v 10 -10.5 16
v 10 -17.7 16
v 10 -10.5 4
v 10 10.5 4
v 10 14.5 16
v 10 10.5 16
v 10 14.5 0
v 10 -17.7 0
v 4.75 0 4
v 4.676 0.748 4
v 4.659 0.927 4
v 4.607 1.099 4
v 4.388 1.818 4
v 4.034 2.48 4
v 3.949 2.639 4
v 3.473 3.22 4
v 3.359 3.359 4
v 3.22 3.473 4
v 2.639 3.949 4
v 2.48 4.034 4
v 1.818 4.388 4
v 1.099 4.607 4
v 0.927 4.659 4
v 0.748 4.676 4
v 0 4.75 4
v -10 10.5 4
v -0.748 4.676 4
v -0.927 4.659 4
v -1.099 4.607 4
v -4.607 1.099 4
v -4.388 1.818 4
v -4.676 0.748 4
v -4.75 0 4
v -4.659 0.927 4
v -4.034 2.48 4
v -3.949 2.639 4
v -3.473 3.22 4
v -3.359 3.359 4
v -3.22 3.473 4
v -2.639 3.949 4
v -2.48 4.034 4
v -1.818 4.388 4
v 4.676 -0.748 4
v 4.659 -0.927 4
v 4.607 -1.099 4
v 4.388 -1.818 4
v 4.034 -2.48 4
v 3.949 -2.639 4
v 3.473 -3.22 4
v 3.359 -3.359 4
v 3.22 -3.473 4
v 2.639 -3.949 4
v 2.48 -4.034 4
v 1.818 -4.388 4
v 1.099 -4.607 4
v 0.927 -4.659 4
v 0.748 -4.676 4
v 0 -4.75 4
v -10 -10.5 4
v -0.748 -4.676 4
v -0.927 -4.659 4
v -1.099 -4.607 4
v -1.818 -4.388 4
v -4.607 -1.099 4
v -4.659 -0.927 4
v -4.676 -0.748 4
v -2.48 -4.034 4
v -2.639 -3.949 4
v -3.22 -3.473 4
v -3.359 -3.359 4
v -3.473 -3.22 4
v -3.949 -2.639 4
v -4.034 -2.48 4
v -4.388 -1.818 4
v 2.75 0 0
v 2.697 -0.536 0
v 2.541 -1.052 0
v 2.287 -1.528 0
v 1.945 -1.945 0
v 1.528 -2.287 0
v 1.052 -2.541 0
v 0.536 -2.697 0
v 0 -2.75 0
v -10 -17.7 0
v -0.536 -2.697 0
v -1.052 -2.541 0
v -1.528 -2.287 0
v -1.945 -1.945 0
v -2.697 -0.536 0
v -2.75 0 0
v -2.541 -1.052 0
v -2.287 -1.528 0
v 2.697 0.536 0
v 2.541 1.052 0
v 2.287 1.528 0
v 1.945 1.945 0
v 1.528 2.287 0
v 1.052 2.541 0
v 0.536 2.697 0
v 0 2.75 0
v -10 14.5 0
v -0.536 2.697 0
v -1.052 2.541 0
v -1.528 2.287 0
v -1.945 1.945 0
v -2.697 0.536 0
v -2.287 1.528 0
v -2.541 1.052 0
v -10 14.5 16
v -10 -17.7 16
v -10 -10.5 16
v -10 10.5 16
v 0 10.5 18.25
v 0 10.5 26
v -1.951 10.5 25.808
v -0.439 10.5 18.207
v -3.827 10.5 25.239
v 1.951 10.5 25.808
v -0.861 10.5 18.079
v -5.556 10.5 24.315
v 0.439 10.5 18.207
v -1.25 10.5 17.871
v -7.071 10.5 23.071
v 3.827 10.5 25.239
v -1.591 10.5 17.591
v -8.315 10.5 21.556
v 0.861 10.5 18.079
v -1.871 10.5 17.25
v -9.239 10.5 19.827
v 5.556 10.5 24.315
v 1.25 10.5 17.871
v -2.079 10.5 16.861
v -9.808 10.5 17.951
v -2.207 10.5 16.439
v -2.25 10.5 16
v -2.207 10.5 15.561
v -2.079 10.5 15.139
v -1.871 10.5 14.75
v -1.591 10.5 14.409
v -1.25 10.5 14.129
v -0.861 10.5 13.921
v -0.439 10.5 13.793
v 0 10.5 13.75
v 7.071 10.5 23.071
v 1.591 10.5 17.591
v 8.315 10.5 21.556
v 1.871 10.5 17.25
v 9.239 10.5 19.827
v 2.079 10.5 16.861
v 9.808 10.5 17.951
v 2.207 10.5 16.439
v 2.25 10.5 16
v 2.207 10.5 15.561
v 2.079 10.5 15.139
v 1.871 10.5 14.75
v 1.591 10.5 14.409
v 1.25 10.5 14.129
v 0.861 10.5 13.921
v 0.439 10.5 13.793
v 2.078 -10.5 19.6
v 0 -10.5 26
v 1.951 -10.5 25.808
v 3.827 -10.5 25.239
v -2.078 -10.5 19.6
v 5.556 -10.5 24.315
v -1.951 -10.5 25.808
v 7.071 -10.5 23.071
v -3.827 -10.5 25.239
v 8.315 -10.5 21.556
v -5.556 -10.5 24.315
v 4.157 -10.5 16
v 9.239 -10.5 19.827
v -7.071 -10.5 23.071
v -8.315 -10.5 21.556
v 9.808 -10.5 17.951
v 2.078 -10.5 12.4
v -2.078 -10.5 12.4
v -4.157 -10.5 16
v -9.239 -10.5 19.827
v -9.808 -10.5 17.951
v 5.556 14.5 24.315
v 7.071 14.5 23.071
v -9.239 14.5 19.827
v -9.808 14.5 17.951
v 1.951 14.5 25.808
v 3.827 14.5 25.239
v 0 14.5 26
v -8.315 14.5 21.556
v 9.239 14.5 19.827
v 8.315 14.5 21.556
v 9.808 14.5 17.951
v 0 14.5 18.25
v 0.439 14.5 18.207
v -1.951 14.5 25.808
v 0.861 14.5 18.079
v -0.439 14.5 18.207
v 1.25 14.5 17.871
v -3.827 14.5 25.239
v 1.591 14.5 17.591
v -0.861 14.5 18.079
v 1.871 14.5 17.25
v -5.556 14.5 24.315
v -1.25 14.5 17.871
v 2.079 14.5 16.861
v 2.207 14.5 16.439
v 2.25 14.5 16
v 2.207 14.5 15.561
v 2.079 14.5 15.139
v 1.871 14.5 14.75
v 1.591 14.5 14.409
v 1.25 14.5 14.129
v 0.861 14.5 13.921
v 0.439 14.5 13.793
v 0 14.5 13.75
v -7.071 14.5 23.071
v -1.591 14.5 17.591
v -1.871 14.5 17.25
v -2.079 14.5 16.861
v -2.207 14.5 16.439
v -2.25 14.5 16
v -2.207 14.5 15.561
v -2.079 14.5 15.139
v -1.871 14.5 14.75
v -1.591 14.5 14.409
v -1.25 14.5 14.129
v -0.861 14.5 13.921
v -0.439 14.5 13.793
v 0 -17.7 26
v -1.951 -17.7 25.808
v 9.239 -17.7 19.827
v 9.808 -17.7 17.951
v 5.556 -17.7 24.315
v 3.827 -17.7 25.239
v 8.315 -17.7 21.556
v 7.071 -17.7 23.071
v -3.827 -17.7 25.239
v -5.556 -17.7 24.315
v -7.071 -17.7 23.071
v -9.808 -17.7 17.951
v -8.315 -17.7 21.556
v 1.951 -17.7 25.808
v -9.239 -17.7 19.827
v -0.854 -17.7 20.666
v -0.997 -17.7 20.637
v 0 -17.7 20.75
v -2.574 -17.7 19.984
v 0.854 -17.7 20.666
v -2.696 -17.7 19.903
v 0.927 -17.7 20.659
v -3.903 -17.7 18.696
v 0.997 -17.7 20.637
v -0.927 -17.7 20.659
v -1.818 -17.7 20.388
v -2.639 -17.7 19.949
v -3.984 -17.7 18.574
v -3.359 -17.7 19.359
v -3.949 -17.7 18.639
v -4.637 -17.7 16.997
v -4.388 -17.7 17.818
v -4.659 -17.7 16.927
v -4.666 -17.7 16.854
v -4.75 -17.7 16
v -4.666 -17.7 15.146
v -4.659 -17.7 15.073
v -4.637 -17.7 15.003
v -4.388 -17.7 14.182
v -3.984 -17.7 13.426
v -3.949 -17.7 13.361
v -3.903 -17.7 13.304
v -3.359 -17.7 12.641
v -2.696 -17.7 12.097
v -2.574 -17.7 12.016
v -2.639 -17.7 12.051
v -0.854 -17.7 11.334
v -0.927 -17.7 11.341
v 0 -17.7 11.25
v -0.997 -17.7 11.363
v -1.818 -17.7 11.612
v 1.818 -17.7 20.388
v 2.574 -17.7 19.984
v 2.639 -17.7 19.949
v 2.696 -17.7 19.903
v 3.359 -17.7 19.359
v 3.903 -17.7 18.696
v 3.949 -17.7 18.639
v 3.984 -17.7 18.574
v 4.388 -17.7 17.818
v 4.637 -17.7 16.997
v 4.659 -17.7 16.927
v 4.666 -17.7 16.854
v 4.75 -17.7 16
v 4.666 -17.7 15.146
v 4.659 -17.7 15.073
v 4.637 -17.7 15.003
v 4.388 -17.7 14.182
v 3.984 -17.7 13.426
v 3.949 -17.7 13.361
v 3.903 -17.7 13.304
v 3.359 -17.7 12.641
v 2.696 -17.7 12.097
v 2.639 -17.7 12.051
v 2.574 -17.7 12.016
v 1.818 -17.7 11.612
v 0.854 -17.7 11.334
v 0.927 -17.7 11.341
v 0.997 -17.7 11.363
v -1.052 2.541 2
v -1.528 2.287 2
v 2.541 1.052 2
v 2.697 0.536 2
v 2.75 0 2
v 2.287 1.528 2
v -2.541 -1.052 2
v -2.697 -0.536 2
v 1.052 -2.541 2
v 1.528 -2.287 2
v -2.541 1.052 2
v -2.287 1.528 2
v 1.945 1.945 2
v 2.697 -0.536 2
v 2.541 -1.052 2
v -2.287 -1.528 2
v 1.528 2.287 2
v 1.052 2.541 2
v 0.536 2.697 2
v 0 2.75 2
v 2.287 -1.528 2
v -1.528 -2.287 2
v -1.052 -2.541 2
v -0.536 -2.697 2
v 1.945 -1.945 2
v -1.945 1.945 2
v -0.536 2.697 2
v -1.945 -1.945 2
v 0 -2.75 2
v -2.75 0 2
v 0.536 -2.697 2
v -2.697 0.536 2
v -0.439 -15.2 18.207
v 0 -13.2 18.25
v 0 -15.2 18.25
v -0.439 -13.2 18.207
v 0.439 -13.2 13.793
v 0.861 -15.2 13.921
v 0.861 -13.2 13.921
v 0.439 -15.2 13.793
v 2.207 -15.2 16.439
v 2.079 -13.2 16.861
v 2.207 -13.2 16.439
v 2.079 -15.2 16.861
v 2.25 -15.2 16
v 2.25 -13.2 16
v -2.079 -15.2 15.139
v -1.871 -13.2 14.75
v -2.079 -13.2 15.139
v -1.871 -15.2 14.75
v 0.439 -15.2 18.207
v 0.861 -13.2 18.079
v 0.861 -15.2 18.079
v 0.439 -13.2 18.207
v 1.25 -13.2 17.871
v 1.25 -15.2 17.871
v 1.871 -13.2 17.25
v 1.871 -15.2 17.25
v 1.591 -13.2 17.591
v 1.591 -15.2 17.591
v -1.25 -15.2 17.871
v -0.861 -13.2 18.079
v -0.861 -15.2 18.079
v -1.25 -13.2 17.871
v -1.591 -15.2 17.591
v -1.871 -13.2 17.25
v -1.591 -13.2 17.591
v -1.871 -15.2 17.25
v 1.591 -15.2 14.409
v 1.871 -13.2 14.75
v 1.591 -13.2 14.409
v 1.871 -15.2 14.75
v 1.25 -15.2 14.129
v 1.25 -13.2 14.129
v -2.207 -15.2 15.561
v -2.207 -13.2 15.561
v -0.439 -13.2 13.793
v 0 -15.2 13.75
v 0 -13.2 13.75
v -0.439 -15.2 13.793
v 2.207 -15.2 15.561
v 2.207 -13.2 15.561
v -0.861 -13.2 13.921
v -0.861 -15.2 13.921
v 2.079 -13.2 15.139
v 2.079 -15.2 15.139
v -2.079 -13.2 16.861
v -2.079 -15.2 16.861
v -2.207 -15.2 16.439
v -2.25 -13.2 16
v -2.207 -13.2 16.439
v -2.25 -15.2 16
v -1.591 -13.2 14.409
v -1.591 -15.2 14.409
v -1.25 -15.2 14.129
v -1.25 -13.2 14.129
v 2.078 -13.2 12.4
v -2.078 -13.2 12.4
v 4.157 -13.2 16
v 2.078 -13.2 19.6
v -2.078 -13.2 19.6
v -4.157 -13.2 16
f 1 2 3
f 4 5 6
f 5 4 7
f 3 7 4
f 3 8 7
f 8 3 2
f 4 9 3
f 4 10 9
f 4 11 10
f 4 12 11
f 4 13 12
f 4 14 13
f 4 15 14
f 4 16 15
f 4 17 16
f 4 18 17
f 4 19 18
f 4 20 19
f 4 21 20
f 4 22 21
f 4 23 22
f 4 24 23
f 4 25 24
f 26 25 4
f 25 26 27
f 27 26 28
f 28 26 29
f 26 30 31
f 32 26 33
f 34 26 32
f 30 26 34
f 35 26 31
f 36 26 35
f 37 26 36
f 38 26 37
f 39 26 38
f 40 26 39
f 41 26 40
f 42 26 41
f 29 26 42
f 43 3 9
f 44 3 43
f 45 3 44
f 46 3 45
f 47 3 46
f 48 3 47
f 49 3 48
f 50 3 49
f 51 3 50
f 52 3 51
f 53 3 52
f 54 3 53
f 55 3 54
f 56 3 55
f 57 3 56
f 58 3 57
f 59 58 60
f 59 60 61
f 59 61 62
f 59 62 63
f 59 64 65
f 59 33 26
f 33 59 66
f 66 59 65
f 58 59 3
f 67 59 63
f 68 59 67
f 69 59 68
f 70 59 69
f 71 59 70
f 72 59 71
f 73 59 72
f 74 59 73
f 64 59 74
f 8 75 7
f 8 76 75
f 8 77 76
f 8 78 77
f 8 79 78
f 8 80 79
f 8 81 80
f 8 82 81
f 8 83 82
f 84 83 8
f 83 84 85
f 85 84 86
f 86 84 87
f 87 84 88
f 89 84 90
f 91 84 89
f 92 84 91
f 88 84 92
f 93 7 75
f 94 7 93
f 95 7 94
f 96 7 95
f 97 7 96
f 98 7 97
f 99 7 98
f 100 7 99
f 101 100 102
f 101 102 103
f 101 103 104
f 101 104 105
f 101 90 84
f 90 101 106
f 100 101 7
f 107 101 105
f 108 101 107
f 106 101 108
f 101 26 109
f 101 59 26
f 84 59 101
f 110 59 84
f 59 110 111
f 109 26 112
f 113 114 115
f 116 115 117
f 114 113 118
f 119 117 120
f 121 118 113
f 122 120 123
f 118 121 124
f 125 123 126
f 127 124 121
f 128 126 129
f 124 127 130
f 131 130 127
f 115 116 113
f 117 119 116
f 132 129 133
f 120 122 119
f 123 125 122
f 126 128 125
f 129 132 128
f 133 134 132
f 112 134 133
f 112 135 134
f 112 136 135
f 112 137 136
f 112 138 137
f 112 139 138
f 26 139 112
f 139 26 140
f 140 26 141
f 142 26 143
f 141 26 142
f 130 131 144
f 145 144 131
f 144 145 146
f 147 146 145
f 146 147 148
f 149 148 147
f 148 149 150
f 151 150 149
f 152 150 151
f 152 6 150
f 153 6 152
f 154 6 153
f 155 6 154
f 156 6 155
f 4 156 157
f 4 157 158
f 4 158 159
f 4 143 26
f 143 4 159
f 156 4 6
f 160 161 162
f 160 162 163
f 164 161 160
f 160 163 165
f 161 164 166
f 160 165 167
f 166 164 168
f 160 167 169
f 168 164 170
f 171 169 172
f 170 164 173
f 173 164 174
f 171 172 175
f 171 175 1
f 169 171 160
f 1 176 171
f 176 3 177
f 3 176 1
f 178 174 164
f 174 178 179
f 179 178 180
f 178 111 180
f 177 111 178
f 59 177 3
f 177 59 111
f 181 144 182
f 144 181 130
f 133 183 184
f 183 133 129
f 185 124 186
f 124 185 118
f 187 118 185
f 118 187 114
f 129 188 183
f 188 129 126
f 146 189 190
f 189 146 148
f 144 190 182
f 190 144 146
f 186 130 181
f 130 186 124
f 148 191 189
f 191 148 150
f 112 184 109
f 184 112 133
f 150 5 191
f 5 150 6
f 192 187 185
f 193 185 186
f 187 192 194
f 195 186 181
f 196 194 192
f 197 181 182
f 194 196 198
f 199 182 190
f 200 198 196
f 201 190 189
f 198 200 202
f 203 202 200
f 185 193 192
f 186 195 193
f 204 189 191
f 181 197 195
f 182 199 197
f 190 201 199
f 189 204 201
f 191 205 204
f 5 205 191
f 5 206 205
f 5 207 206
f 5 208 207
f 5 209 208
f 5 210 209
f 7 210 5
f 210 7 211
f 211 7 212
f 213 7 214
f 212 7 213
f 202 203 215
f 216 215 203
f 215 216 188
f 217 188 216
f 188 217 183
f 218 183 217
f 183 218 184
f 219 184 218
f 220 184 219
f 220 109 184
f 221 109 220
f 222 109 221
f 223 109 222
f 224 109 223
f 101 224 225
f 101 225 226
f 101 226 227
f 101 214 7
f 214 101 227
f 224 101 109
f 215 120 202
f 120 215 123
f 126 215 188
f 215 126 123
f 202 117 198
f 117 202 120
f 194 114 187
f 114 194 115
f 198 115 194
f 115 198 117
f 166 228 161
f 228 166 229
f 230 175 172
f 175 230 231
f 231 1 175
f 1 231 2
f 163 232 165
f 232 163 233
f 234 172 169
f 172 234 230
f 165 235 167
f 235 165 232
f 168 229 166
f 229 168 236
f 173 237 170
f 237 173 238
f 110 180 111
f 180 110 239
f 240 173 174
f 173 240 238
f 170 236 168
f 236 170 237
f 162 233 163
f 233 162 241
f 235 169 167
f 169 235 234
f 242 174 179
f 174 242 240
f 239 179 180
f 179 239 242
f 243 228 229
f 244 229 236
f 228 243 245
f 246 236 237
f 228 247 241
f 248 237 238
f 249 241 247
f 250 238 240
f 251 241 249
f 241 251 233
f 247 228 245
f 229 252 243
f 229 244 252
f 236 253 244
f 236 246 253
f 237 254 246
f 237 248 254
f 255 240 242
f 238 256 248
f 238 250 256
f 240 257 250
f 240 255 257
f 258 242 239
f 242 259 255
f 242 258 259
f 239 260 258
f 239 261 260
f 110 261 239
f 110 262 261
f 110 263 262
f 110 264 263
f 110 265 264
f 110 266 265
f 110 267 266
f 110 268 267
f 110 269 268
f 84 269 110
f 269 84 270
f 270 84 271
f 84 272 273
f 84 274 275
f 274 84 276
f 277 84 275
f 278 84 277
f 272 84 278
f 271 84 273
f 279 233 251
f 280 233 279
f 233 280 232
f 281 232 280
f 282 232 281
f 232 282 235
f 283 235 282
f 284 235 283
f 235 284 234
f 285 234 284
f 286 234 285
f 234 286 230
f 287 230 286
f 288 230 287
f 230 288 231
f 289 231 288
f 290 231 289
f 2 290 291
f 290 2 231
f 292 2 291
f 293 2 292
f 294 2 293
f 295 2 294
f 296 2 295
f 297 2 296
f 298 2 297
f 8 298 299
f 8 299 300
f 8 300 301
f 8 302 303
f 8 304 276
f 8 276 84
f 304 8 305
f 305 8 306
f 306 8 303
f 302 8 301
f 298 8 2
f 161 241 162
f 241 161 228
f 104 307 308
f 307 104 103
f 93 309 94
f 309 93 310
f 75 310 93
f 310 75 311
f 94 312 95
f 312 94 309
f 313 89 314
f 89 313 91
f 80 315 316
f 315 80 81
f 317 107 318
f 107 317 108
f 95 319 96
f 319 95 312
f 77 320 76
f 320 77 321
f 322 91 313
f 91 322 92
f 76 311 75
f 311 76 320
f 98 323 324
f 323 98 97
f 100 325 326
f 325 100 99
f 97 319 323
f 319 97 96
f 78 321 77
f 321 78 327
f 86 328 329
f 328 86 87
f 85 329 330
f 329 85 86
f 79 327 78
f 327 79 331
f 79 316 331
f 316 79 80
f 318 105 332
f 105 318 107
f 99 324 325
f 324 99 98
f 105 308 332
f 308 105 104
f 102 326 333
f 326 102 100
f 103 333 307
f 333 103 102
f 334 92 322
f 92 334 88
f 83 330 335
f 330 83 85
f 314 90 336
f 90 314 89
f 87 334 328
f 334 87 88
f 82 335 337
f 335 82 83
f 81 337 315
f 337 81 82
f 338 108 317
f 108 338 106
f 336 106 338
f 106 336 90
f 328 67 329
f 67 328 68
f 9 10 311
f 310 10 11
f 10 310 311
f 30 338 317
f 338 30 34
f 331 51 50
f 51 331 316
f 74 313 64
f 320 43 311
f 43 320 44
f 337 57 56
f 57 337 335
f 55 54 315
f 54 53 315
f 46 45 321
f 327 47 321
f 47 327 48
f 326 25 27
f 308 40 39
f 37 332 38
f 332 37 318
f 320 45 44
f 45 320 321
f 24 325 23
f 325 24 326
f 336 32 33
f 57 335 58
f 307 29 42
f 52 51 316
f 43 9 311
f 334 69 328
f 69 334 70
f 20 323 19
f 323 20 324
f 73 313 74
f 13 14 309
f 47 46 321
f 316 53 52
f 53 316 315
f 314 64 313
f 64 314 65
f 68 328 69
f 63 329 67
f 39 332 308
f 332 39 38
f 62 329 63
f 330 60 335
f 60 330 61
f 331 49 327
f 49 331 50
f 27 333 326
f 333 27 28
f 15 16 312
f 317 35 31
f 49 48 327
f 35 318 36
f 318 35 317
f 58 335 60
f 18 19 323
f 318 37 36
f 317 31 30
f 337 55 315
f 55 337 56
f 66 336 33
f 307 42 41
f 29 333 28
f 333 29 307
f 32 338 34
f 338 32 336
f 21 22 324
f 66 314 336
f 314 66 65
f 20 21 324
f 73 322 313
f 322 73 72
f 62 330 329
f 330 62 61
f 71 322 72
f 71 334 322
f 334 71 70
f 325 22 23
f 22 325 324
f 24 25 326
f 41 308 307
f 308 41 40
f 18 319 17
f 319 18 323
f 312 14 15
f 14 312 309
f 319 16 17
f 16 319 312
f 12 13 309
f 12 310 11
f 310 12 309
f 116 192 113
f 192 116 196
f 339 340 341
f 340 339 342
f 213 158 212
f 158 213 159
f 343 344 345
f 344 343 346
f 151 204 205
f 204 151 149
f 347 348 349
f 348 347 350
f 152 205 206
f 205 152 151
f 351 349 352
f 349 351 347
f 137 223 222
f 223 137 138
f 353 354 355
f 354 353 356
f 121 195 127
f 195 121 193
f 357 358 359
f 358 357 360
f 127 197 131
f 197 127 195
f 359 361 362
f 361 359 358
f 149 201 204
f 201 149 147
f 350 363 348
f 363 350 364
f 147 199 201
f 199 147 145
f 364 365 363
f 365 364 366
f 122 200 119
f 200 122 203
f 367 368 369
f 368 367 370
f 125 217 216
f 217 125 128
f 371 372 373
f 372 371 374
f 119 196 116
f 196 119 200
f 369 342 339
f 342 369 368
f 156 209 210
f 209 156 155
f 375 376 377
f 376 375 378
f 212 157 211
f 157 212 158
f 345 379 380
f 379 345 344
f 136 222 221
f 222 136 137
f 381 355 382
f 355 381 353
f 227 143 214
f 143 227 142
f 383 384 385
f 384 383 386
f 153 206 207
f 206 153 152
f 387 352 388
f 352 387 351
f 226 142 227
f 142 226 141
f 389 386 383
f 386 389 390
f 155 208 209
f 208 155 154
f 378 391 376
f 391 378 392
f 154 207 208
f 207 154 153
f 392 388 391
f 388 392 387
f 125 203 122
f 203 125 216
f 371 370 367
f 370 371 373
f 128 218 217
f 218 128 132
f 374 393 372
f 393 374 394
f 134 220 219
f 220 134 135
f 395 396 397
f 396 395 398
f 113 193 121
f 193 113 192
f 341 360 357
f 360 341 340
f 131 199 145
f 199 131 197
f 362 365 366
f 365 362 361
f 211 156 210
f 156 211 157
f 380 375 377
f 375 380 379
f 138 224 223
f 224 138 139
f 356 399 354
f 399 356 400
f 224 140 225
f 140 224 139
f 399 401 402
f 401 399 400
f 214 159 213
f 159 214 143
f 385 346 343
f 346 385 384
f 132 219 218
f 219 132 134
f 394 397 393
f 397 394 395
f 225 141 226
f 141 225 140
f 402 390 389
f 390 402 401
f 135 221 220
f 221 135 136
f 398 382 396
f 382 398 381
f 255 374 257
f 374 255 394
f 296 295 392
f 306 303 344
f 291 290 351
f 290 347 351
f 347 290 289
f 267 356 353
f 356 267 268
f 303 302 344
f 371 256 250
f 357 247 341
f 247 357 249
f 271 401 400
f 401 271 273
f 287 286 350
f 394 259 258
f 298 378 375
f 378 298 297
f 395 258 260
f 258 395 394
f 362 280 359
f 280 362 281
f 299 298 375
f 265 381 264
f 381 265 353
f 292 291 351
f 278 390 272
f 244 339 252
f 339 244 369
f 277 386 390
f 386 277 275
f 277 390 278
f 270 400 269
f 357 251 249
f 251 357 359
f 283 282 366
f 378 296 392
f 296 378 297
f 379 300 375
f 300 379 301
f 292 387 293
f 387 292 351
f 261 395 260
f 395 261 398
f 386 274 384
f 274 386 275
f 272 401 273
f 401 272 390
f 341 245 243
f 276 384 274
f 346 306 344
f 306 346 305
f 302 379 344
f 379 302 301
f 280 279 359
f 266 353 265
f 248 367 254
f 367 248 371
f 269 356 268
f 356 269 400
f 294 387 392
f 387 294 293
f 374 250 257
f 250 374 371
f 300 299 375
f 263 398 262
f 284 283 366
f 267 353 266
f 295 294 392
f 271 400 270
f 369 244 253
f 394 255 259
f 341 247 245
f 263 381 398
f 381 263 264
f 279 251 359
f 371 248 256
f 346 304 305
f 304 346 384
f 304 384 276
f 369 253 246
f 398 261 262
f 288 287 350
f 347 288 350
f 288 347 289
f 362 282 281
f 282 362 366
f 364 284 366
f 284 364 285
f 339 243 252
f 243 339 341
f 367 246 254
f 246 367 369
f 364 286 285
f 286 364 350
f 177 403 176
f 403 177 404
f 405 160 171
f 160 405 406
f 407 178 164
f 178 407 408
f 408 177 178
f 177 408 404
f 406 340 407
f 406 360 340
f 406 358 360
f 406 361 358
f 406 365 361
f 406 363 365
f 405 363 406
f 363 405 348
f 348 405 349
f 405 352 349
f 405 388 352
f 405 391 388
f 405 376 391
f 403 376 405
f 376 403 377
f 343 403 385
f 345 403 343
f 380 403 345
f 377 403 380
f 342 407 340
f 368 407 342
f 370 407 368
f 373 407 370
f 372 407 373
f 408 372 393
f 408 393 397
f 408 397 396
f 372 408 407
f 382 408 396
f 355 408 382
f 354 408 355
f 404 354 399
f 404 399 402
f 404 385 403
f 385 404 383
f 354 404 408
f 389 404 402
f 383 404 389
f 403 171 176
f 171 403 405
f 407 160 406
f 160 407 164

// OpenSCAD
// file: modules.scad
// Fonctions personnalisées

//http://forum.openscad.org/Wish-mirror-copy-true-td10681.html
module copy_mirror(vec=[0,1,0])
{
    children();
    mirror(vec) children();
}

module ecrou(plat,h){
  cylinder(d=plat*2/sqrt(3), h=h, $fn=6);
}


module courroie(diam,longueur){
  color ("black")
  difference(){
    hull(){
      cylinder(d=diam+1, h=6, $fn=32);
      translate([longueur,0,0]) cylinder(d=diam+1, h=6, $fn=32);
    }
    translate([0,0,-1])
    hull(){
      cylinder(d=diam-1, h=8, $fn=32);
      translate([longueur,0,0]) cylinder(d=diam-1, h=8, $fn=32);
    }
  }
  
  
}
// file: config.scad
// Paramètres de la machine

decal=-30;            // décallage du chassis xz
hauteur=400;          // hauteur totale chassis
largeur=400;          // largeur totale chassis
longueur=470;         // longueur totale chassis
hauteur_base=90;      // hauteur de la base
entraxe_y=140;        // distance entre les tiges Ø8 axe Y
entraxe_x=45;         // distance entre les tiges Ø8 axe X

couleur=[1,0.6,0];


// Plats écrous
ec3=5.7;
ec4=7.2;
ec5=8.2;
ec6=10.2;

// Jeu sur plats pour les écrous glissants
jec=0.2;

// hauteur écrous
ec3h=2.4;
ec4h=3.2;
ec5h=4.7;
ec6h=5.2;

// Vis
vis3=3.5;
vis4=4.5;
vis5=5.5;
vis6=6.5;


// Paramètre des pièces et jeux

// écart plateau/courroie
// y_belt_holder
belt_h=13;      // écart entre la courroie et le plateau

// écart plateau/tiges lisses
// y_lm8uu
decal_plateau=12; // Décallage en Y

// décallage des tiges lisses Y
// support_tige8_y
decal_tiges=5;

// décallage moteur Y
// y_motor
decal_motory_z=11;
decal_motory_y=25;

// Equerres de fixation position fermée
eq_ec=10;      // écart entre profilés

// Fixations axe Z
pos_z=26;      // position des axes par rapport au profilé (>= 21)
hauteur_z=20;  // hauteur des fixations
entraxe_z=17;  // distance entre les tiges Ø8 et M5
// est ce que la tige de 8 dépasse du profilé de 30?
// si oui, on décale les fixations
decalx=max(-42/2+entraxe_z+8/2+2, 0);

// Roulements linéaires
lbd = 15; // diamètre ext
lbh = 24; // hauteur

// x_carriage
he_x=23;  // entraxe hotend x
he_y=23;  // entraxe hotend y
sen_x=20; // entraxe capteur x
sen_y=23; // entraxe capteur y

// sensor_holder
sen_ep=3;   // épaisseur
sen_d=12.5; // diamètre du capteur
sen_pos=0;  // décentrage en x du capteur
sen_z=7;    // position Z de la bague

// y_belt_idler
ybi_ep1=4;       // épaisseur de la partie fixe
ybi_ep2=4;       // épaisseur de la partie mobile
ybi_h=16;        // position de l'axe
ybi_ec=11;       // écart pour le passage du ou des roulement
ybi_vis=vis4;    // diamètre passage de vis (axe)
ybi_ecrou=ec4;   // plat écrou
ybi_ecrouh=ec4h; // hauteur écrou
ybi_long=60;     // longueur de la partie mobile entre axes
ybi_prof=15;     // largeur de la partie mobile


// nombre de dents des poulies
poulie=20;

// Pas des courroies
pas=2;

// diamètre des poulies
dpoulie=poulie*pas/3.1416;
// main file
// eLKa1
// y_belt_idler
// GNU GPL v3
// lkiefer <blog.lkiefer.org> and contributors
// http://www.reprap.org/wiki/ELKa
// https://github.com/kimented/elka1

include <config.scad>;
use <modules.scad>;

module y_belt_idler_1(){
  largeur=20; //20
  $fn=32;
  echo ("y_belt_idler");
  echo ("├ écrou M4");
  echo (str("└ vis FS M4 x ", (ybi_ec+ybi_ep2*2)+1));
    
  color (couleur){
    difference(){
      union(){
        // Base
        translate([-largeur/2,-(ybi_ec+ybi_ep2*2)/2-0.5-0.5,0]) cube([largeur, (ybi_ec+ybi_ep2*2)+1+1, ybi_ep1]);
        // Coté trou simple
        translate([0,(ybi_ec+ybi_ep2*2)/2+0.5+0.5,ybi_h]) rotate([-90,0,0]) cylinder(d=largeur,h=ybi_ep1);
        translate([-largeur/2,(ybi_ec+ybi_ep2*2)/2+0.5+0.5,0]) cube([largeur,ybi_ep1,ybi_h]);
        // Coté écrou
        translate([0,-(ybi_ec+ybi_ep2*2)/2-0.5-0.5,ybi_h]) rotate([90,0,0]) cylinder(d=largeur,h=ybi_ep1+ybi_ecrouh);
        translate([-largeur/2,-(ybi_ec+ybi_ep2*2)/2-ybi_ep1-ybi_ecrouh-0.5-0.5,0]) cube([largeur,ybi_ep1+ybi_ecrouh,ybi_h]);  
      }
      // Vis fixation
      translate([0,0,-1]) cylinder(d=vis5,h=ybi_ep1+2);
      translate([0,0,ybi_ep1-2]) cylinder(d1=vis5, d2=vis5+6, h=3);
      // Vis axe
      translate([0,0,ybi_h]) rotate([90,0,0]) cylinder(d=ybi_vis, h=(ybi_ec+ybi_ep2*2)+2*ybi_ep1+2*ybi_ecrouh+2, center=true);
      translate([0,-(ybi_ec+ybi_ep2*2)/2-ybi_ep1-ybi_ecrouh+2-0.5,ybi_h]) rotate([90,0,0]) cylinder(d1=ybi_vis, d2=ybi_vis+6, h=3);
      // Écrou
      translate([0,-(ybi_ec+ybi_ep2*2)/2+1-0.5,ybi_h]) rotate([90,0,0]) ecrou(ybi_ecrou,ybi_ecrouh+1);
    }

    /*difference(){
      // Renfort
      copy_mirror([1,0,0]) translate([-largeur/2,-(ybi_ec+ybi_ep2*2)/2]) cube([3,(ybi_ec+ybi_ep2*2),ybi_h-2]);
      translate([0,0,ybi_h]) rotate([90,0,0]) cylinder(d=largeur-1, h=(ybi_ec+ybi_ep2*2)+2, center=true);
      
    }*/
  }
}

y_belt_idler_1();
